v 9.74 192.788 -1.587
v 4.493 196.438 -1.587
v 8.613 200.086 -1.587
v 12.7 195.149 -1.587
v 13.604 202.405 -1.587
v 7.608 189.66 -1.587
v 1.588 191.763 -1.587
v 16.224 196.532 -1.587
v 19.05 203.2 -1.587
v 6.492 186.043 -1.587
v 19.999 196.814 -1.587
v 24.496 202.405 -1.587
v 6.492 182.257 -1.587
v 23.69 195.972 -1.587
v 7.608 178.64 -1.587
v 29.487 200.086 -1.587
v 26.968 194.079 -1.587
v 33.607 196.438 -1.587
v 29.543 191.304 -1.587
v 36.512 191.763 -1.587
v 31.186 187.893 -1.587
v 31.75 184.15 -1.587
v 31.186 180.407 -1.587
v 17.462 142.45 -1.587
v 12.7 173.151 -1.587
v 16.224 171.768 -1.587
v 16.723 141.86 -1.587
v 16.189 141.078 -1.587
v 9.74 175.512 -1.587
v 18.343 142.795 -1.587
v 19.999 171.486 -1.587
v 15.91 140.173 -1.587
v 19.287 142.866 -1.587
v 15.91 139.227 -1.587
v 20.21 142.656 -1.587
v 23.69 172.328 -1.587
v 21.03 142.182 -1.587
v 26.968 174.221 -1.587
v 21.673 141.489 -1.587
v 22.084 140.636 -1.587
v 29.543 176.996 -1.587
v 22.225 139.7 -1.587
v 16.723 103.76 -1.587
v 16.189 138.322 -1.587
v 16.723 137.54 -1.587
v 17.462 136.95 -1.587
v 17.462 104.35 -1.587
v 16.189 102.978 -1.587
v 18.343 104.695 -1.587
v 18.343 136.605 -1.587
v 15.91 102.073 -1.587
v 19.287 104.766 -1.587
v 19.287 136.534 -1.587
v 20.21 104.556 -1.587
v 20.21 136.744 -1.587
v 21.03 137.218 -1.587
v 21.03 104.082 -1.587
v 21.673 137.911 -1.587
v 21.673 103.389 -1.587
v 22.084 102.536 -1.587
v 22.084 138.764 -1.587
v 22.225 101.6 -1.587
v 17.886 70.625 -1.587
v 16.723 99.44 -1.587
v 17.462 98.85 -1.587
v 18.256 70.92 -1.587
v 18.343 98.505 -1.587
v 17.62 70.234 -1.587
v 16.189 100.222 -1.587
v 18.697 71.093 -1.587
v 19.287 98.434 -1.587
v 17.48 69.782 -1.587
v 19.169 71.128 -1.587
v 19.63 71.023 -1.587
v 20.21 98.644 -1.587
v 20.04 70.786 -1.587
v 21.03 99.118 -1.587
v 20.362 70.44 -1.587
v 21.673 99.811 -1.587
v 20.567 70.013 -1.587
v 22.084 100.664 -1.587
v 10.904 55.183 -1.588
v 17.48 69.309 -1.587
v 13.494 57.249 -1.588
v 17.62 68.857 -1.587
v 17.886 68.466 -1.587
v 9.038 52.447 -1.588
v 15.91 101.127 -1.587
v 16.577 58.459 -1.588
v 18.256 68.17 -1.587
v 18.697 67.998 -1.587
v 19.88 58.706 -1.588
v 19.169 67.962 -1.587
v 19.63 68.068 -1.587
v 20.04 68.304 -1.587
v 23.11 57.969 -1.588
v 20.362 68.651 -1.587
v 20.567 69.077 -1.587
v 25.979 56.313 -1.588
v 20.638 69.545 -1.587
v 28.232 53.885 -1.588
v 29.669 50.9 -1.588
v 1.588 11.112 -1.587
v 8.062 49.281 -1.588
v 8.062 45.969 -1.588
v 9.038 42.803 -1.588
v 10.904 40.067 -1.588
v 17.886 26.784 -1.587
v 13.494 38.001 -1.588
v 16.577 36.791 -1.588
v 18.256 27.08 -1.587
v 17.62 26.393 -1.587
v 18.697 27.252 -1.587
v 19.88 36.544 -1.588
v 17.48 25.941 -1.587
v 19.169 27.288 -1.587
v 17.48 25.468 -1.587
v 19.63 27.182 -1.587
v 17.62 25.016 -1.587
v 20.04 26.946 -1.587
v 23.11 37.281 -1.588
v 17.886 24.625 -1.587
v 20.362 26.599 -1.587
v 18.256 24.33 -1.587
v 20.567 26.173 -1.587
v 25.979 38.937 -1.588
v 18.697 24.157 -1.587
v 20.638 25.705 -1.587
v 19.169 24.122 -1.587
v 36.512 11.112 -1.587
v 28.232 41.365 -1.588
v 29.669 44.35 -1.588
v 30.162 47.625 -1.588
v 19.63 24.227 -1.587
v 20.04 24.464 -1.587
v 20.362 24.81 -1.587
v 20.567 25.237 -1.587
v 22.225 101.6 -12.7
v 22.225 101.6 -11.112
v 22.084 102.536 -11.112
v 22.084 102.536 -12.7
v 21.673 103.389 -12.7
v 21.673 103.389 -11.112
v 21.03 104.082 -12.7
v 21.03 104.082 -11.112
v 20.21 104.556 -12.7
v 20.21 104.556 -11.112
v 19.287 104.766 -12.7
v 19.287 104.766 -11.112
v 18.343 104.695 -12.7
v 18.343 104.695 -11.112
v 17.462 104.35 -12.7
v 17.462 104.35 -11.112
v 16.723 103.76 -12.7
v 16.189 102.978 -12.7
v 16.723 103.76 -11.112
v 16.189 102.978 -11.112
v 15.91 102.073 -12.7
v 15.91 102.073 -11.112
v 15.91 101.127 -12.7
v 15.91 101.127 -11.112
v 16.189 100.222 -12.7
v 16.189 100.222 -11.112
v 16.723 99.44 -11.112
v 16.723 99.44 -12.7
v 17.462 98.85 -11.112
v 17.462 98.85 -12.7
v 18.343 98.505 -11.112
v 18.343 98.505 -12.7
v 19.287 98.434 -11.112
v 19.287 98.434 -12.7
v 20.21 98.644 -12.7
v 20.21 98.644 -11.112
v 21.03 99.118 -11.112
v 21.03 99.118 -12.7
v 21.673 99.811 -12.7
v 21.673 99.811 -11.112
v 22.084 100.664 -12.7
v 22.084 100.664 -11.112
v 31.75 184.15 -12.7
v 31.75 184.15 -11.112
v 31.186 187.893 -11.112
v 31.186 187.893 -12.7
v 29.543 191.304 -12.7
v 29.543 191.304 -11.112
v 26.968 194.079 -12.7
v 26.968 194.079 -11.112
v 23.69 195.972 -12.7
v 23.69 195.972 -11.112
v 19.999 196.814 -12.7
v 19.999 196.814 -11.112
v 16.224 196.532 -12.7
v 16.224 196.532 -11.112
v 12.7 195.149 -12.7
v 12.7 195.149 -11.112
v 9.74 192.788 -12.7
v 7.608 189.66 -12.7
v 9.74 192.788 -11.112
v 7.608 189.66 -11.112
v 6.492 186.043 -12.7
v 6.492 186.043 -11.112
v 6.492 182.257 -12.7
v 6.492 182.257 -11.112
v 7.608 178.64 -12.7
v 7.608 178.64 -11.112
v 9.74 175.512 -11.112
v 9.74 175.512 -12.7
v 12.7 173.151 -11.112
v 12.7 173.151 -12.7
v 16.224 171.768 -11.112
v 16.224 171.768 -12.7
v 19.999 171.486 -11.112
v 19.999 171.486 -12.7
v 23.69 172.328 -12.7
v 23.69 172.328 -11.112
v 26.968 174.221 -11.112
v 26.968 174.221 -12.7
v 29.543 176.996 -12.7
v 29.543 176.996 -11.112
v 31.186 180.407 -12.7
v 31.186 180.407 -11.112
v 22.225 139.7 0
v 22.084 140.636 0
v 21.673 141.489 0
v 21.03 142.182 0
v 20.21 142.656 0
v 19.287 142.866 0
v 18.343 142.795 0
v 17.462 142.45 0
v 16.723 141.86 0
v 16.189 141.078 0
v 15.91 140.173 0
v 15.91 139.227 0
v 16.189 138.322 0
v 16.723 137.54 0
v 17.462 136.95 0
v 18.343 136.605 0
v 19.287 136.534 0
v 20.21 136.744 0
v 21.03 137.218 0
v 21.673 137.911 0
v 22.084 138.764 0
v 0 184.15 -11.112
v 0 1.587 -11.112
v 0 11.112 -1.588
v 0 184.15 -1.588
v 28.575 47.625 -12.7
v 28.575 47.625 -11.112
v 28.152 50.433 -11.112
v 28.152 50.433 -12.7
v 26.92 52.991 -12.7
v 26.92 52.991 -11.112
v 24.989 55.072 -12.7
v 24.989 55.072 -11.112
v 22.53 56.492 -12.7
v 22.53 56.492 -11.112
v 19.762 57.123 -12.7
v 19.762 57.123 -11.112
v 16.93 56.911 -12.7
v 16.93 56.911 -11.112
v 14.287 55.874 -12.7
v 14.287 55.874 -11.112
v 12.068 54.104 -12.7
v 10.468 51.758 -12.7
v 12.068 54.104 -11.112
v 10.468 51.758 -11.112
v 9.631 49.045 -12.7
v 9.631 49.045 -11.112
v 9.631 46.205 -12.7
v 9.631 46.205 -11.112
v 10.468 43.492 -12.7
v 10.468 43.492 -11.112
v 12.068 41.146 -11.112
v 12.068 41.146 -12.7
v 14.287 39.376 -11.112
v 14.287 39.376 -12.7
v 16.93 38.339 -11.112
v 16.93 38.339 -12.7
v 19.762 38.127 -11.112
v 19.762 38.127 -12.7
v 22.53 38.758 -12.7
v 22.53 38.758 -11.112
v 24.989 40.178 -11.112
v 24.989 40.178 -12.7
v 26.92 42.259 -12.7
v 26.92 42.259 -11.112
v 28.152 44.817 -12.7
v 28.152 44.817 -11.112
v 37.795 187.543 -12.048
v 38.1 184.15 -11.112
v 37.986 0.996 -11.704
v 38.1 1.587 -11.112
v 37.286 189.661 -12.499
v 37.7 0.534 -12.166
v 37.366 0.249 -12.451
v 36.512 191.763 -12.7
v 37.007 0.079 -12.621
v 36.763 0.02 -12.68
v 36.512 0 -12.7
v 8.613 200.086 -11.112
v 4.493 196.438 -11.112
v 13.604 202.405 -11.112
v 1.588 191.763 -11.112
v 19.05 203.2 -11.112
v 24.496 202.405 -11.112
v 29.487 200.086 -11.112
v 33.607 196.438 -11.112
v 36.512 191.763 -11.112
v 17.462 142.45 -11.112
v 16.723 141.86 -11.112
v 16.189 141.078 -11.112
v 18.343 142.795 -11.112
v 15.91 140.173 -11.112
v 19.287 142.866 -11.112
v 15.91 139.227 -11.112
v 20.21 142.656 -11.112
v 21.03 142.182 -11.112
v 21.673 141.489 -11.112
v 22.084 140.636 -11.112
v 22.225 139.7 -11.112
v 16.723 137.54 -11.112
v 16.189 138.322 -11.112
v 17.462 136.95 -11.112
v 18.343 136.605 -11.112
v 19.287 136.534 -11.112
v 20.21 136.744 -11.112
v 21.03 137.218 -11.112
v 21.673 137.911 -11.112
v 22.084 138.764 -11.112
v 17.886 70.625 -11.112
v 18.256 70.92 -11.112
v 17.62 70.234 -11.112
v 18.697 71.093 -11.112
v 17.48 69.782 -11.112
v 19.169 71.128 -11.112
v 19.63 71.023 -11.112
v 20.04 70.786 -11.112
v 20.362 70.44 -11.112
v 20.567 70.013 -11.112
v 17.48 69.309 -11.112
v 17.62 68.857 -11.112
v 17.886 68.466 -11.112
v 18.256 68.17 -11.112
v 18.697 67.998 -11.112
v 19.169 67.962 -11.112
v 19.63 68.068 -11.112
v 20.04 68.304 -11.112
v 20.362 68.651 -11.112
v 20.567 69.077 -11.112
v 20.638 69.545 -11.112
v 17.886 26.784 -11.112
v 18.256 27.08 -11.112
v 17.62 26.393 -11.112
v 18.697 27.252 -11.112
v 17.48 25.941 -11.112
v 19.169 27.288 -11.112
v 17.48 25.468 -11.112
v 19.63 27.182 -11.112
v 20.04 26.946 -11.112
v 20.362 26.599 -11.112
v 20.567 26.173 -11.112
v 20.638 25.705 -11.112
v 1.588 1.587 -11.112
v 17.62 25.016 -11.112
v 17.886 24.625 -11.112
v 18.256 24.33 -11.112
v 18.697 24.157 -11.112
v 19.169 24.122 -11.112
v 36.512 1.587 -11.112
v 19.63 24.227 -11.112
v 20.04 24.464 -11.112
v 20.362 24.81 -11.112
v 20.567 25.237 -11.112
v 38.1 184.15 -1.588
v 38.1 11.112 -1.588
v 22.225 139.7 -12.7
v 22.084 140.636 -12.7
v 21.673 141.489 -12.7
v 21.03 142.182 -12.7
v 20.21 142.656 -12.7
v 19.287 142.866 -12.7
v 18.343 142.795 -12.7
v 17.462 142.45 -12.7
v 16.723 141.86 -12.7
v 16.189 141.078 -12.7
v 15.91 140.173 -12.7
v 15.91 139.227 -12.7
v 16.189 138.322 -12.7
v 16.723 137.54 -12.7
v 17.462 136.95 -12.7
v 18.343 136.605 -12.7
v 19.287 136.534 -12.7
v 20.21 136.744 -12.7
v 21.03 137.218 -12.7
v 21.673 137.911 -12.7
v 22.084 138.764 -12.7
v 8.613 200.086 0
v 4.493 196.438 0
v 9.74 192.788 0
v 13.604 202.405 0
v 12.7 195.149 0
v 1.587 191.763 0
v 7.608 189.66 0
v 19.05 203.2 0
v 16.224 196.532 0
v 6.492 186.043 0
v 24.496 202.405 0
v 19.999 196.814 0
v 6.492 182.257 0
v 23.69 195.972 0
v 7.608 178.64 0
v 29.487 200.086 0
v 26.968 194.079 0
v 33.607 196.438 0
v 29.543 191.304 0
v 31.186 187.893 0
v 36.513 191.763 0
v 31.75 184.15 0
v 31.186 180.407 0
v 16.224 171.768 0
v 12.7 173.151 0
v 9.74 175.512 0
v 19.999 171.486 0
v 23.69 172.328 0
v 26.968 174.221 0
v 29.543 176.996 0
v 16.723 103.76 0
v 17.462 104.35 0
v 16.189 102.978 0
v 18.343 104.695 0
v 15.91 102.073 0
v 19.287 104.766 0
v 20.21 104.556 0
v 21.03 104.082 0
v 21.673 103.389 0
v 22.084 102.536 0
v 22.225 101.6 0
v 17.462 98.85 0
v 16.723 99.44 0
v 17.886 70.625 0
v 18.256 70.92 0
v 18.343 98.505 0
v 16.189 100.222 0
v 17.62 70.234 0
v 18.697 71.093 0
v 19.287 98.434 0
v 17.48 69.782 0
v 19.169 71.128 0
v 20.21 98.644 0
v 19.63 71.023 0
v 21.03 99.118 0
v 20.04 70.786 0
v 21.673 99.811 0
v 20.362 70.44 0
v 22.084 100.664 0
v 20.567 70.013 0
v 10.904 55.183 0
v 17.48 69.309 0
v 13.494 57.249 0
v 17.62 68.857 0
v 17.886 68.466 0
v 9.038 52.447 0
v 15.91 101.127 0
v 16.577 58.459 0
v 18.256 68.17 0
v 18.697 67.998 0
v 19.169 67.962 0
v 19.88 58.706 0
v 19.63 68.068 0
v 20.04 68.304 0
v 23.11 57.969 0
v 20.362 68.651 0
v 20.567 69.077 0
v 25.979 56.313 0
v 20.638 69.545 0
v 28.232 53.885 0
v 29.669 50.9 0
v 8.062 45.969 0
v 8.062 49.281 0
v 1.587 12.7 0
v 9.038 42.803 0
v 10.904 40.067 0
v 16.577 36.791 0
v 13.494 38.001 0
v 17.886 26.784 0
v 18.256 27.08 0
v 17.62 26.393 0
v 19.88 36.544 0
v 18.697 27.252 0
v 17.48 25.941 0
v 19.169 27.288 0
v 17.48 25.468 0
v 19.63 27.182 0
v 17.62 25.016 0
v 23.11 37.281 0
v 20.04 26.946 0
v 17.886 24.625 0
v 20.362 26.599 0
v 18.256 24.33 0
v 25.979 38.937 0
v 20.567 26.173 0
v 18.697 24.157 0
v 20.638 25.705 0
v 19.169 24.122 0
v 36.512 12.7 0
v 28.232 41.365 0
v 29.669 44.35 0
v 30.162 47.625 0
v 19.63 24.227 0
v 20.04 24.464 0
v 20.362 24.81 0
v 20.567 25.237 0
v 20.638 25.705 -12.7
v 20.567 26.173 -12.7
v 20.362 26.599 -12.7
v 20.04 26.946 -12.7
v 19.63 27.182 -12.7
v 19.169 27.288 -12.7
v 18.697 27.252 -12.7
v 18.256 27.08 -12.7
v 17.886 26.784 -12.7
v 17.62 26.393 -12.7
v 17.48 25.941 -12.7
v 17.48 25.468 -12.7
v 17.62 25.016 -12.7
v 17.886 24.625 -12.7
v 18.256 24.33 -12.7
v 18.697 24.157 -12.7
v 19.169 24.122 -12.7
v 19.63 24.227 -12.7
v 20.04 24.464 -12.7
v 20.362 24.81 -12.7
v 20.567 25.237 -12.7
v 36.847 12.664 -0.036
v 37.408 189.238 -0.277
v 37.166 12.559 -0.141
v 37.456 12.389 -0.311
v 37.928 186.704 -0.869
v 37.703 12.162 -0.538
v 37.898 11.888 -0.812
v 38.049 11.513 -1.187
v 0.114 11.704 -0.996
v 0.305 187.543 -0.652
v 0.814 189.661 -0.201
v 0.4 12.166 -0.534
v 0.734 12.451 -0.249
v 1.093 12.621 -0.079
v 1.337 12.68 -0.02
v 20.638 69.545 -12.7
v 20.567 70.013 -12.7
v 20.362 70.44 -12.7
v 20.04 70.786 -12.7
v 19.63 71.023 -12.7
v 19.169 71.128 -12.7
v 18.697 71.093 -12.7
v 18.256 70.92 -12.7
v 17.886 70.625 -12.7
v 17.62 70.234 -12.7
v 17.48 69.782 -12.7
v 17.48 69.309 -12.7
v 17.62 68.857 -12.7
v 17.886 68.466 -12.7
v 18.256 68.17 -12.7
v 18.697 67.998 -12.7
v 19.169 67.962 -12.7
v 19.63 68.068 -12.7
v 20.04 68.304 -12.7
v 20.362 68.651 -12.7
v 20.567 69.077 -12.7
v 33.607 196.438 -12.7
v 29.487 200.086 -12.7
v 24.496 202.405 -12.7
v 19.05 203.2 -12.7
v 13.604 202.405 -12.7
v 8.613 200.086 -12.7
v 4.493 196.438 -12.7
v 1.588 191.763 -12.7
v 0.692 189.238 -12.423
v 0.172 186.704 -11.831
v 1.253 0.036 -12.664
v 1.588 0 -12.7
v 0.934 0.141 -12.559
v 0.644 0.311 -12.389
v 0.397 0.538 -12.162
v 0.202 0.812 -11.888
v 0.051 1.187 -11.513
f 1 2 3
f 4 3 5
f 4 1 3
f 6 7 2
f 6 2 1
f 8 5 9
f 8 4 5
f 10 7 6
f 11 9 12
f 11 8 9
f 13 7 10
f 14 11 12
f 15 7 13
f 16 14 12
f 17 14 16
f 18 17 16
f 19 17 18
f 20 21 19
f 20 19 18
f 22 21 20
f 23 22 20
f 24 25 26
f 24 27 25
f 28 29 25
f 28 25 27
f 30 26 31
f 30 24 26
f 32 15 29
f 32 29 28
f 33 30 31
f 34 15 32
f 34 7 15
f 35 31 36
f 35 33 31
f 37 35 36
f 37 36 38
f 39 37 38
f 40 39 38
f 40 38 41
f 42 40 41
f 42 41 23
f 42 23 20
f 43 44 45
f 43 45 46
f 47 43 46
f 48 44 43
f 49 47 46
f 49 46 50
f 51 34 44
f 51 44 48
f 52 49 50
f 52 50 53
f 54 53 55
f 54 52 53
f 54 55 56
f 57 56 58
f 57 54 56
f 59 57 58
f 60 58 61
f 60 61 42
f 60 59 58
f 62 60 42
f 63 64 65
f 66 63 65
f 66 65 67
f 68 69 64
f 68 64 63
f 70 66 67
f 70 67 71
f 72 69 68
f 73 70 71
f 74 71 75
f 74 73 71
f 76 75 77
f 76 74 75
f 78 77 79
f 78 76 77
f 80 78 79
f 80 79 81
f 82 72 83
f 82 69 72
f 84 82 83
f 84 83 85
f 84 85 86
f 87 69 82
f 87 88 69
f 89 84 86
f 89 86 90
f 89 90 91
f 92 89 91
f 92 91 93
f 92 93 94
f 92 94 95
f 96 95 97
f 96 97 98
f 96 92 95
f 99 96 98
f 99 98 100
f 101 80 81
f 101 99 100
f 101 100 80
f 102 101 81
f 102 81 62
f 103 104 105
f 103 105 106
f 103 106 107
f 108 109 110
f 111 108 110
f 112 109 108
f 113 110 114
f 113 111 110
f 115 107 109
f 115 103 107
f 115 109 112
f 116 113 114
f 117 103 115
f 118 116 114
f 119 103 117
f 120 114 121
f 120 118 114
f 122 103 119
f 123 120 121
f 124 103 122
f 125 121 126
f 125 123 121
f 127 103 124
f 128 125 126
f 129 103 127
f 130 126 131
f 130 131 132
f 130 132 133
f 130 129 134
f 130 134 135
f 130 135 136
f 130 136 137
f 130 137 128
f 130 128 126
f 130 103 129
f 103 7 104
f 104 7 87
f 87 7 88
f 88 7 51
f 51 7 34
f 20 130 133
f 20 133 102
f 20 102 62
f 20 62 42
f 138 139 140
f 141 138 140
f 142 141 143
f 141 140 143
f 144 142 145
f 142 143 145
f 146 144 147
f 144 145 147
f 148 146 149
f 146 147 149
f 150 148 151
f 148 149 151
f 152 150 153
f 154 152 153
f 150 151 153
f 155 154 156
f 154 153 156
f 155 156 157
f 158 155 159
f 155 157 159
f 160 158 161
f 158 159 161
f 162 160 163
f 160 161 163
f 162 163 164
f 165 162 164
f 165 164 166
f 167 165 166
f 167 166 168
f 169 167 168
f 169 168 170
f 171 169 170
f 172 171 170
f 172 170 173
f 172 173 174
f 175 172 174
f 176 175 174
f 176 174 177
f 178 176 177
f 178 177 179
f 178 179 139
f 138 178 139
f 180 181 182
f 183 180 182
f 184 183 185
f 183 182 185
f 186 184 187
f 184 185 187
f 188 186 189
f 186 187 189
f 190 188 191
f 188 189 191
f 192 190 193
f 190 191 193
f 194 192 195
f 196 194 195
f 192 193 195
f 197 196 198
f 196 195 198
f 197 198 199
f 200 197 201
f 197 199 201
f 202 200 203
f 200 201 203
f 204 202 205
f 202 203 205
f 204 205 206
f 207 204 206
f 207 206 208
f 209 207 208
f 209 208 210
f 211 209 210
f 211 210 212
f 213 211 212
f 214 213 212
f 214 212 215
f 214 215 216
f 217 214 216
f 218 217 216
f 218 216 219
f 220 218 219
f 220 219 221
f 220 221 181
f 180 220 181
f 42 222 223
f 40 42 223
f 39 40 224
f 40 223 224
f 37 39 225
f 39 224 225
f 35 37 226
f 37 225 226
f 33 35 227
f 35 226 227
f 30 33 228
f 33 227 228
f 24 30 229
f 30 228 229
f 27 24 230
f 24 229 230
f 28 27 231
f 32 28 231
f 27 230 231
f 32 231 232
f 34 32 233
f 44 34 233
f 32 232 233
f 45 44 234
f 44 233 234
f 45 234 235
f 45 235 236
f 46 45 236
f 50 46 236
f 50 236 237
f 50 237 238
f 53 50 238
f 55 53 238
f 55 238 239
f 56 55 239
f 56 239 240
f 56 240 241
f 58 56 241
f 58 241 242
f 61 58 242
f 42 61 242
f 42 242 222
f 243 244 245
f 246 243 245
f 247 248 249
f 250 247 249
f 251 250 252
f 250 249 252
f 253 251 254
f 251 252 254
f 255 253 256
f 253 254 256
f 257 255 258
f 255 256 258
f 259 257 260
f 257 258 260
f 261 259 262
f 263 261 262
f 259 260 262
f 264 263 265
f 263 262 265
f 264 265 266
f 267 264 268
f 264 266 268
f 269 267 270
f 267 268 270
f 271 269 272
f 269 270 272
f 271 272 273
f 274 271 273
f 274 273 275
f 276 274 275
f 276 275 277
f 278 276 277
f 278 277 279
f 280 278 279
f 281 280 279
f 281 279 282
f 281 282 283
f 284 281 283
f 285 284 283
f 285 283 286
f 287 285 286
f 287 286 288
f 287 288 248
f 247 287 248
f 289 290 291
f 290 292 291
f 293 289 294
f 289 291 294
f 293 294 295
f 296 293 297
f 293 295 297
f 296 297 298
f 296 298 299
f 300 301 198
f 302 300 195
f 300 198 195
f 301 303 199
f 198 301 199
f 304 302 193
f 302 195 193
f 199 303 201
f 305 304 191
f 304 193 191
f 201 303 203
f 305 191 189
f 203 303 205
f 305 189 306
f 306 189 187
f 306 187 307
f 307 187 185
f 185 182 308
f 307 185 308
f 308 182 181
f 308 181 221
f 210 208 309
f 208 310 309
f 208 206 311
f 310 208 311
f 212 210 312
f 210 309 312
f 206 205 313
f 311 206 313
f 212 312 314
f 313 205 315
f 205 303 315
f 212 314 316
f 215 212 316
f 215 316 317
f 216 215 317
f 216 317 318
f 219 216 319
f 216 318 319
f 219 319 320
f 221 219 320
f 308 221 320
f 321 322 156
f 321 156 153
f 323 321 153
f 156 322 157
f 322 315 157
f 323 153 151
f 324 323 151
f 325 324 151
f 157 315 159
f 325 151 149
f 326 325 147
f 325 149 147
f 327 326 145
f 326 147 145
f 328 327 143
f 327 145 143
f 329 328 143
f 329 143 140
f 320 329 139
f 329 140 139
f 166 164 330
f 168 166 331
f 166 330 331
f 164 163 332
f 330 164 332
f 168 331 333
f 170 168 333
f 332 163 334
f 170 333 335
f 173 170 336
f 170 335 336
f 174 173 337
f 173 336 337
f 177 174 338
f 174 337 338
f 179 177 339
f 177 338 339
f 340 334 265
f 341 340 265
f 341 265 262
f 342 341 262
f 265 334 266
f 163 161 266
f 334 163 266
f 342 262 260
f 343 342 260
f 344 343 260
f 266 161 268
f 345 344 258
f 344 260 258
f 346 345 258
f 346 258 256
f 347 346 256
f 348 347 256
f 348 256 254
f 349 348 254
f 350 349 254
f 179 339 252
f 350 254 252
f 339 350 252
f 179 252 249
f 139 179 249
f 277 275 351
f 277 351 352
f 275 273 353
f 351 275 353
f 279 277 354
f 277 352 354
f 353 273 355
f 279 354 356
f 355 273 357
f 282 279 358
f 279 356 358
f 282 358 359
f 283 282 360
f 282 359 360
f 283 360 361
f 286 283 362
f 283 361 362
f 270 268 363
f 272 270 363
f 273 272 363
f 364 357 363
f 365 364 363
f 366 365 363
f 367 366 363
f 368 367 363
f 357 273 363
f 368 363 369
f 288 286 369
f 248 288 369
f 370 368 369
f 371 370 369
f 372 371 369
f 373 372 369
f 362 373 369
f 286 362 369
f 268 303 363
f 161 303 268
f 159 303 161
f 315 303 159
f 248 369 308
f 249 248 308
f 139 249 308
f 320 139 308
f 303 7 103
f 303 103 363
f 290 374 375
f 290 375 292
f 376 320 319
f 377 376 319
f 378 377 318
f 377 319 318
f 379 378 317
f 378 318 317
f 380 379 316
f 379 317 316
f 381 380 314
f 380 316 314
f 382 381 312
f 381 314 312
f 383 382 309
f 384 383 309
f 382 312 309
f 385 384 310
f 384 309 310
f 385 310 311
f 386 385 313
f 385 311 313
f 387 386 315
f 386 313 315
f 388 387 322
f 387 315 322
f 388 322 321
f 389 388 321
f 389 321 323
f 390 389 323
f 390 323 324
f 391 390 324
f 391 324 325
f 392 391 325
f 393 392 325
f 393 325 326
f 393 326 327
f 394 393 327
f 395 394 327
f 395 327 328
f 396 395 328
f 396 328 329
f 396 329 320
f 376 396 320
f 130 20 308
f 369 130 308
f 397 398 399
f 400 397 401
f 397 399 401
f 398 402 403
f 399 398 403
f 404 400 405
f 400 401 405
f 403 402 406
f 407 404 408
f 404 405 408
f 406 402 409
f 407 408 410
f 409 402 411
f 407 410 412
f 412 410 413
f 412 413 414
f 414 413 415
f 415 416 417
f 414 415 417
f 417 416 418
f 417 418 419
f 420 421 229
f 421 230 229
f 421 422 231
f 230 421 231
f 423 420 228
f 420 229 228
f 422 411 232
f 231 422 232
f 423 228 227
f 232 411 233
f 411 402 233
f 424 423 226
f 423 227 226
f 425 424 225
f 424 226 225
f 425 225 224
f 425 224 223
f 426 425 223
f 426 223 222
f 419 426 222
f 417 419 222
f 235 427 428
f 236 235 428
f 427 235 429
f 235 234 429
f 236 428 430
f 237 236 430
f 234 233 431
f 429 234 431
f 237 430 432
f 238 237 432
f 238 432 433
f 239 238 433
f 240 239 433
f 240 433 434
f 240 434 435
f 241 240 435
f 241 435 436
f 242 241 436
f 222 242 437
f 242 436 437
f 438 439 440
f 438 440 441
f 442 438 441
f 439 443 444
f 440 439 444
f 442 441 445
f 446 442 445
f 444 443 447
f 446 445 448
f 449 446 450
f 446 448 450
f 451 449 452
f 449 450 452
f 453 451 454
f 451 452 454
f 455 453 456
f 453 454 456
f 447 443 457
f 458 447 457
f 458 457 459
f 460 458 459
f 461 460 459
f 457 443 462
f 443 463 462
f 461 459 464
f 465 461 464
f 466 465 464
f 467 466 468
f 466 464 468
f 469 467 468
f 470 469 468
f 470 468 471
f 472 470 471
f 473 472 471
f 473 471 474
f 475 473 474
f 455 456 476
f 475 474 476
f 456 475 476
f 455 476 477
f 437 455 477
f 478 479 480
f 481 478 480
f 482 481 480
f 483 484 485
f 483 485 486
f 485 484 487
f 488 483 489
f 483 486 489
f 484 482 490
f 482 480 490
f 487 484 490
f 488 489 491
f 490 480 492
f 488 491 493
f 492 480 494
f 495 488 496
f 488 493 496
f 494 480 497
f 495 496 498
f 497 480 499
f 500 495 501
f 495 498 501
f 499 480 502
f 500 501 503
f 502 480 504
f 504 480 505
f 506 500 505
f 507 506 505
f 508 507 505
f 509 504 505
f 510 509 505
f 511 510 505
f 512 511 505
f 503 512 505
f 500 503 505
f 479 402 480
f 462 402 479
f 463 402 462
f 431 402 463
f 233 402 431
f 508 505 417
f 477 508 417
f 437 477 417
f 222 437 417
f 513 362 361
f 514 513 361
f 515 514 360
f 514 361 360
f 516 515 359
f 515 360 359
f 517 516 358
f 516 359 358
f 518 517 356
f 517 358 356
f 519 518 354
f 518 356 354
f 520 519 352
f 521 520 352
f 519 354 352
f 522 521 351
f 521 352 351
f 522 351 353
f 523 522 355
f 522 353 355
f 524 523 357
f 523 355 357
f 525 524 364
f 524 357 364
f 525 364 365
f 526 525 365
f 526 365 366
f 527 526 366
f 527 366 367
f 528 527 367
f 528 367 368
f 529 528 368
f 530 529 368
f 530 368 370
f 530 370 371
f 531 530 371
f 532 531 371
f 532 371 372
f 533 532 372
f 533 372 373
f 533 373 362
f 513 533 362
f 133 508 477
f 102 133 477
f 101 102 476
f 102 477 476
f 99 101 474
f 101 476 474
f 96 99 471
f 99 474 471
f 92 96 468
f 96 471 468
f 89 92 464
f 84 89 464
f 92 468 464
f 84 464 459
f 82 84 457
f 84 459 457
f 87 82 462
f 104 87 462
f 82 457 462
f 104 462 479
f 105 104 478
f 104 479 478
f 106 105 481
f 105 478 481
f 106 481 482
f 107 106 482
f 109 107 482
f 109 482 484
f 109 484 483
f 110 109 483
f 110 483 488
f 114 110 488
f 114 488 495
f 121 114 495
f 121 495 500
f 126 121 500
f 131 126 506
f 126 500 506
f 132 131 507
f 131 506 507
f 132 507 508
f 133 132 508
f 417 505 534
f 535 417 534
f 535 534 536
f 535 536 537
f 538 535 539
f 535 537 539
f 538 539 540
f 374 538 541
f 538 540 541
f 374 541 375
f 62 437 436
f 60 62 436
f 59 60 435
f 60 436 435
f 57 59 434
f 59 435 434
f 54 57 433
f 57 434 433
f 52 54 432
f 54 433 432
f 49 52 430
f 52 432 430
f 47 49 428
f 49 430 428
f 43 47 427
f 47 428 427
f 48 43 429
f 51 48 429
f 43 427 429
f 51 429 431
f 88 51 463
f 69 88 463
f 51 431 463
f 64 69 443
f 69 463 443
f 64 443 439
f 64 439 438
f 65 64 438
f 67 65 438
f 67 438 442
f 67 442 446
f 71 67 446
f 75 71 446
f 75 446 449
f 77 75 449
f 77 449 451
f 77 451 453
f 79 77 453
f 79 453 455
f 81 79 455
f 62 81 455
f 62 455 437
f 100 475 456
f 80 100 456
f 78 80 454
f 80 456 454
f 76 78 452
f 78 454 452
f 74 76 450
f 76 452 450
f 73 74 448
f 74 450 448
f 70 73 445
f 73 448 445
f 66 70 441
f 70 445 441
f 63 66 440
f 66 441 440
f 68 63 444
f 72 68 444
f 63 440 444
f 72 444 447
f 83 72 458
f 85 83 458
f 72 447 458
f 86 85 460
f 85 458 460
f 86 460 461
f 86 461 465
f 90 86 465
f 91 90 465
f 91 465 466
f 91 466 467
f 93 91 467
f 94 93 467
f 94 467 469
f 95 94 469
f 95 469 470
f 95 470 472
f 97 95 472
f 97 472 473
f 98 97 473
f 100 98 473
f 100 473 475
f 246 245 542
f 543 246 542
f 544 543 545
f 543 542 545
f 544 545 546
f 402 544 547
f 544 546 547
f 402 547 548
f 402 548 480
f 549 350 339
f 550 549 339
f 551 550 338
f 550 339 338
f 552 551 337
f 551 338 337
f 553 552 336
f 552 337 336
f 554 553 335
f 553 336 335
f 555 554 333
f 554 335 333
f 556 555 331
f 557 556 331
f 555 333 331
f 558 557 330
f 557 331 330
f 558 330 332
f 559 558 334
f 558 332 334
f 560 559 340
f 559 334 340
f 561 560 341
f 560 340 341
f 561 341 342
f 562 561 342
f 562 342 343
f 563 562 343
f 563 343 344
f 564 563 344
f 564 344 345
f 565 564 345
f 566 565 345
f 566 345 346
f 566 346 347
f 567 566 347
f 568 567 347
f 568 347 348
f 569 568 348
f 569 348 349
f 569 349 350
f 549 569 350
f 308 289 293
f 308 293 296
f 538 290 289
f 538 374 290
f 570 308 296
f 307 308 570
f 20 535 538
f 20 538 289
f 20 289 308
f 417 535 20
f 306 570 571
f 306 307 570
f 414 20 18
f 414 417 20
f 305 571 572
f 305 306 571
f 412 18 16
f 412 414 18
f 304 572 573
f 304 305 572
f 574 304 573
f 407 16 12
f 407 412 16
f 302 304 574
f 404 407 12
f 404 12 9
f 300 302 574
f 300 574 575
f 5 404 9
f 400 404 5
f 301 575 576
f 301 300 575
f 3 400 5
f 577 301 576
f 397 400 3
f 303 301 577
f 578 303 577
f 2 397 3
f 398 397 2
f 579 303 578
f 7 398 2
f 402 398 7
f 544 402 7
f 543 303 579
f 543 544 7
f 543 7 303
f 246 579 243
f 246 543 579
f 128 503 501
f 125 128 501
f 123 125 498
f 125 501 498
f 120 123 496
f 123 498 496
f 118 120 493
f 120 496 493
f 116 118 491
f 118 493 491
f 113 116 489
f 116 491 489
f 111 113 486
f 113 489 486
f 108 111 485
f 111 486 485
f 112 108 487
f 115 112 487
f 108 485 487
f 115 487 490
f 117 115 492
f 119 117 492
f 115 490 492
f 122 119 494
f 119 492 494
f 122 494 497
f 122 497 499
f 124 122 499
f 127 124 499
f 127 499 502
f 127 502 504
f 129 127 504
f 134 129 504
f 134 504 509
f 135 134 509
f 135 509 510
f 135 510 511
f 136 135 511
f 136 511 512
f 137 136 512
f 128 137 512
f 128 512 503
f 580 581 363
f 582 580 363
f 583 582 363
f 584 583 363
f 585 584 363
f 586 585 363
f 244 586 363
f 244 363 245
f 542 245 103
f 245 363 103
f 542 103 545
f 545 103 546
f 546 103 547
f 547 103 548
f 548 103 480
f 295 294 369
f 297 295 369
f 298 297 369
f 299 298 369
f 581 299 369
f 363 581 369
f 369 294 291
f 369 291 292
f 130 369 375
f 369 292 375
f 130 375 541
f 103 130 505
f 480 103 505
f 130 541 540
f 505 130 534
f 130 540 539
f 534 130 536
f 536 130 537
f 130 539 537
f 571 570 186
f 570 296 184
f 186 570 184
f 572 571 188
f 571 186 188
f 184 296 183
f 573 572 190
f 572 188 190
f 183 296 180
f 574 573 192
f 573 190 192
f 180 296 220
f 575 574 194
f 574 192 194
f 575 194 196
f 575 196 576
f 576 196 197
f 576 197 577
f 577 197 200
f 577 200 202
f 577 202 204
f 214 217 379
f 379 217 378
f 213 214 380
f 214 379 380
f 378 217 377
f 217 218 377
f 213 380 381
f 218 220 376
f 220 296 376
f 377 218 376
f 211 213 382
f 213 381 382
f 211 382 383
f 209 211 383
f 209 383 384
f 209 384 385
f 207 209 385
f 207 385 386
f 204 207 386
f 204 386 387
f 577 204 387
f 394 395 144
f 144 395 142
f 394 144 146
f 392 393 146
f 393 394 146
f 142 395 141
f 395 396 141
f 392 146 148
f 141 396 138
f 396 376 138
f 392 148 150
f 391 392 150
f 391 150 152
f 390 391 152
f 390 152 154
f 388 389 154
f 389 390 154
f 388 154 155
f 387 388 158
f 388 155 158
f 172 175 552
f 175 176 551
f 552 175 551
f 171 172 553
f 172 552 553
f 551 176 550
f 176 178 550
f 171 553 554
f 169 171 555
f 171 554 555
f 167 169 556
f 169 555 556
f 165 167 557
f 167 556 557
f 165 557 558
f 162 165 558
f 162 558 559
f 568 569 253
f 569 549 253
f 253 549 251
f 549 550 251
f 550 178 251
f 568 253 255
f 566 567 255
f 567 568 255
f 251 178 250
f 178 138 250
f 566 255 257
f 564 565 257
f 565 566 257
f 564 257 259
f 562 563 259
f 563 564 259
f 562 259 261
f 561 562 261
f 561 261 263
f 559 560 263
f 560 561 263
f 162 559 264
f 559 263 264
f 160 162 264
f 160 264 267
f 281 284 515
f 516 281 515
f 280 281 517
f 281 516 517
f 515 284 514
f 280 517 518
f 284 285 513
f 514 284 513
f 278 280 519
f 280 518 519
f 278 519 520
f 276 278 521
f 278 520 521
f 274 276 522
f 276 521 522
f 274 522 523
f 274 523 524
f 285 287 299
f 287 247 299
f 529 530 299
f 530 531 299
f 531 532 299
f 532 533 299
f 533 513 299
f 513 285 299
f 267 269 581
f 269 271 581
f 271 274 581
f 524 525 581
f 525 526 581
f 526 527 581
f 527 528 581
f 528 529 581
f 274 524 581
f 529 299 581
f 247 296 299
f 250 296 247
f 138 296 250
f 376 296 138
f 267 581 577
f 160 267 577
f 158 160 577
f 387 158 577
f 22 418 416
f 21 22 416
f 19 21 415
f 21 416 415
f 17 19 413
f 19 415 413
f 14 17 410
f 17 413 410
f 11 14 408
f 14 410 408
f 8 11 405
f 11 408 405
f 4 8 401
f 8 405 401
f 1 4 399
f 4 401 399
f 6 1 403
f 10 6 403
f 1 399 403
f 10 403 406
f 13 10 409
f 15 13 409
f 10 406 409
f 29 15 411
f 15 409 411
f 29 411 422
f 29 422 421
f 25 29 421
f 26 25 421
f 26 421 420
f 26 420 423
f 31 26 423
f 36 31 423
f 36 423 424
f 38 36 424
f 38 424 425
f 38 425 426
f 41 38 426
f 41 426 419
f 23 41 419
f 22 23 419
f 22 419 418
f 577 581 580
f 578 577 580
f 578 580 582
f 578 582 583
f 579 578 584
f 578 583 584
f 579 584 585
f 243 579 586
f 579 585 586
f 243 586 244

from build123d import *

# Parameters (mm, degrees)
SKETCH1_W           = 34.925
SKETCH1_H           = 9.525
BOSS_EXTRUDE1_DEPTH = 203.2
SKETCH2_R           = 3.175
SKETCH2_R_2         = 12.7
SKETCH2_R_3         = 1.5875
SKETCH2_R_4         = 9.525
CUT_EXTRUDE1_DEPTH  = 13.7
CUT_EXTRUDE2_DEPTH  = 39.1000001
SKETCH4_R           = 11.1125
CUT_EXTRUDE3_DEPTH  = 1.5875


with BuildPart() as part:
    # Sketch1 → Boss-Extrude1 (new body)
    with BuildSketch(Plane(origin=(0, 0, 0), x_dir=(1, 0, 0), z_dir=(0, 1, 0))):
        with BuildLine():
            Line((1.5875, 0), (36.5125, 0))
            ThreePointArc((36.5125, 0), (37.635032015, 0.464967985), (38.1, 1.5875))
            Line((38.1, 1.5875), (38.1, 11.1125))
            ThreePointArc((38.1, 11.1125), (37.635032015, 12.235032015), (36.5125, 12.7))
            Line((36.5125, 12.7), (1.5875, 12.7))
            ThreePointArc((1.5875, 12.7), (0.464967985, 12.235032015), (0, 11.1125))
            Line((0, 11.1125), (0, 1.5875))
            ThreePointArc((0, 1.5875), (0.464967985, 0.464967985), (1.5875, 0))
        make_face()
        with Locations((19.05, 6.35)):
            Rectangle(SKETCH1_W, SKETCH1_H, mode=Mode.SUBTRACT)
    extrude(amount=BOSS_EXTRUDE1_DEPTH)

    # Sketch2 → Cut-Extrude1 (cut, through all)
    with BuildSketch(Plane.XY):
        with Locations((19.05, 101.6)):
            Circle(SKETCH2_R)
        with Locations((19.05, 139.7)):
            Circle(SKETCH2_R)
        with Locations((19.05, 184.15)):
            Circle(SKETCH2_R_2)
        with Locations((19.05, 25.704689783)):
            Circle(SKETCH2_R_3)
        with Locations((19.05, 47.625)):
            Circle(SKETCH2_R_4)
        with Locations((19.05, 69.545310217)):
            Circle(SKETCH2_R_3)
        with BuildLine():
            Line((0, 184.15), (0, 209.55))
            Line((0, 209.55), (38.1, 209.55))
            Line((38.1, 209.55), (38.1, 184.15))
            ThreePointArc((38.1, 184.15), (19.05, 203.2), (0, 184.15))
        make_face()
    extrude(amount=-CUT_EXTRUDE1_DEPTH, mode=Mode.SUBTRACT)

    # Sketch3 → Cut-Extrude2 (cut, through all)
    with BuildSketch(Plane(origin=(38.1, 0, 0), x_dir=(0, 0, -1), z_dir=(1, 0, 0))):
        Polygon((0, 0), (12.7, 0), (0, 12.7), align=None)
    extrude(amount=-CUT_EXTRUDE2_DEPTH, mode=Mode.SUBTRACT)

    # Sketch4 → Cut-Extrude3 (cut)
    with BuildSketch(Plane.XY):
        with Locations((19.05, 47.625)):
            Circle(SKETCH4_R)
    extrude(amount=-CUT_EXTRUDE3_DEPTH, mode=Mode.SUBTRACT)


solid = part.part
